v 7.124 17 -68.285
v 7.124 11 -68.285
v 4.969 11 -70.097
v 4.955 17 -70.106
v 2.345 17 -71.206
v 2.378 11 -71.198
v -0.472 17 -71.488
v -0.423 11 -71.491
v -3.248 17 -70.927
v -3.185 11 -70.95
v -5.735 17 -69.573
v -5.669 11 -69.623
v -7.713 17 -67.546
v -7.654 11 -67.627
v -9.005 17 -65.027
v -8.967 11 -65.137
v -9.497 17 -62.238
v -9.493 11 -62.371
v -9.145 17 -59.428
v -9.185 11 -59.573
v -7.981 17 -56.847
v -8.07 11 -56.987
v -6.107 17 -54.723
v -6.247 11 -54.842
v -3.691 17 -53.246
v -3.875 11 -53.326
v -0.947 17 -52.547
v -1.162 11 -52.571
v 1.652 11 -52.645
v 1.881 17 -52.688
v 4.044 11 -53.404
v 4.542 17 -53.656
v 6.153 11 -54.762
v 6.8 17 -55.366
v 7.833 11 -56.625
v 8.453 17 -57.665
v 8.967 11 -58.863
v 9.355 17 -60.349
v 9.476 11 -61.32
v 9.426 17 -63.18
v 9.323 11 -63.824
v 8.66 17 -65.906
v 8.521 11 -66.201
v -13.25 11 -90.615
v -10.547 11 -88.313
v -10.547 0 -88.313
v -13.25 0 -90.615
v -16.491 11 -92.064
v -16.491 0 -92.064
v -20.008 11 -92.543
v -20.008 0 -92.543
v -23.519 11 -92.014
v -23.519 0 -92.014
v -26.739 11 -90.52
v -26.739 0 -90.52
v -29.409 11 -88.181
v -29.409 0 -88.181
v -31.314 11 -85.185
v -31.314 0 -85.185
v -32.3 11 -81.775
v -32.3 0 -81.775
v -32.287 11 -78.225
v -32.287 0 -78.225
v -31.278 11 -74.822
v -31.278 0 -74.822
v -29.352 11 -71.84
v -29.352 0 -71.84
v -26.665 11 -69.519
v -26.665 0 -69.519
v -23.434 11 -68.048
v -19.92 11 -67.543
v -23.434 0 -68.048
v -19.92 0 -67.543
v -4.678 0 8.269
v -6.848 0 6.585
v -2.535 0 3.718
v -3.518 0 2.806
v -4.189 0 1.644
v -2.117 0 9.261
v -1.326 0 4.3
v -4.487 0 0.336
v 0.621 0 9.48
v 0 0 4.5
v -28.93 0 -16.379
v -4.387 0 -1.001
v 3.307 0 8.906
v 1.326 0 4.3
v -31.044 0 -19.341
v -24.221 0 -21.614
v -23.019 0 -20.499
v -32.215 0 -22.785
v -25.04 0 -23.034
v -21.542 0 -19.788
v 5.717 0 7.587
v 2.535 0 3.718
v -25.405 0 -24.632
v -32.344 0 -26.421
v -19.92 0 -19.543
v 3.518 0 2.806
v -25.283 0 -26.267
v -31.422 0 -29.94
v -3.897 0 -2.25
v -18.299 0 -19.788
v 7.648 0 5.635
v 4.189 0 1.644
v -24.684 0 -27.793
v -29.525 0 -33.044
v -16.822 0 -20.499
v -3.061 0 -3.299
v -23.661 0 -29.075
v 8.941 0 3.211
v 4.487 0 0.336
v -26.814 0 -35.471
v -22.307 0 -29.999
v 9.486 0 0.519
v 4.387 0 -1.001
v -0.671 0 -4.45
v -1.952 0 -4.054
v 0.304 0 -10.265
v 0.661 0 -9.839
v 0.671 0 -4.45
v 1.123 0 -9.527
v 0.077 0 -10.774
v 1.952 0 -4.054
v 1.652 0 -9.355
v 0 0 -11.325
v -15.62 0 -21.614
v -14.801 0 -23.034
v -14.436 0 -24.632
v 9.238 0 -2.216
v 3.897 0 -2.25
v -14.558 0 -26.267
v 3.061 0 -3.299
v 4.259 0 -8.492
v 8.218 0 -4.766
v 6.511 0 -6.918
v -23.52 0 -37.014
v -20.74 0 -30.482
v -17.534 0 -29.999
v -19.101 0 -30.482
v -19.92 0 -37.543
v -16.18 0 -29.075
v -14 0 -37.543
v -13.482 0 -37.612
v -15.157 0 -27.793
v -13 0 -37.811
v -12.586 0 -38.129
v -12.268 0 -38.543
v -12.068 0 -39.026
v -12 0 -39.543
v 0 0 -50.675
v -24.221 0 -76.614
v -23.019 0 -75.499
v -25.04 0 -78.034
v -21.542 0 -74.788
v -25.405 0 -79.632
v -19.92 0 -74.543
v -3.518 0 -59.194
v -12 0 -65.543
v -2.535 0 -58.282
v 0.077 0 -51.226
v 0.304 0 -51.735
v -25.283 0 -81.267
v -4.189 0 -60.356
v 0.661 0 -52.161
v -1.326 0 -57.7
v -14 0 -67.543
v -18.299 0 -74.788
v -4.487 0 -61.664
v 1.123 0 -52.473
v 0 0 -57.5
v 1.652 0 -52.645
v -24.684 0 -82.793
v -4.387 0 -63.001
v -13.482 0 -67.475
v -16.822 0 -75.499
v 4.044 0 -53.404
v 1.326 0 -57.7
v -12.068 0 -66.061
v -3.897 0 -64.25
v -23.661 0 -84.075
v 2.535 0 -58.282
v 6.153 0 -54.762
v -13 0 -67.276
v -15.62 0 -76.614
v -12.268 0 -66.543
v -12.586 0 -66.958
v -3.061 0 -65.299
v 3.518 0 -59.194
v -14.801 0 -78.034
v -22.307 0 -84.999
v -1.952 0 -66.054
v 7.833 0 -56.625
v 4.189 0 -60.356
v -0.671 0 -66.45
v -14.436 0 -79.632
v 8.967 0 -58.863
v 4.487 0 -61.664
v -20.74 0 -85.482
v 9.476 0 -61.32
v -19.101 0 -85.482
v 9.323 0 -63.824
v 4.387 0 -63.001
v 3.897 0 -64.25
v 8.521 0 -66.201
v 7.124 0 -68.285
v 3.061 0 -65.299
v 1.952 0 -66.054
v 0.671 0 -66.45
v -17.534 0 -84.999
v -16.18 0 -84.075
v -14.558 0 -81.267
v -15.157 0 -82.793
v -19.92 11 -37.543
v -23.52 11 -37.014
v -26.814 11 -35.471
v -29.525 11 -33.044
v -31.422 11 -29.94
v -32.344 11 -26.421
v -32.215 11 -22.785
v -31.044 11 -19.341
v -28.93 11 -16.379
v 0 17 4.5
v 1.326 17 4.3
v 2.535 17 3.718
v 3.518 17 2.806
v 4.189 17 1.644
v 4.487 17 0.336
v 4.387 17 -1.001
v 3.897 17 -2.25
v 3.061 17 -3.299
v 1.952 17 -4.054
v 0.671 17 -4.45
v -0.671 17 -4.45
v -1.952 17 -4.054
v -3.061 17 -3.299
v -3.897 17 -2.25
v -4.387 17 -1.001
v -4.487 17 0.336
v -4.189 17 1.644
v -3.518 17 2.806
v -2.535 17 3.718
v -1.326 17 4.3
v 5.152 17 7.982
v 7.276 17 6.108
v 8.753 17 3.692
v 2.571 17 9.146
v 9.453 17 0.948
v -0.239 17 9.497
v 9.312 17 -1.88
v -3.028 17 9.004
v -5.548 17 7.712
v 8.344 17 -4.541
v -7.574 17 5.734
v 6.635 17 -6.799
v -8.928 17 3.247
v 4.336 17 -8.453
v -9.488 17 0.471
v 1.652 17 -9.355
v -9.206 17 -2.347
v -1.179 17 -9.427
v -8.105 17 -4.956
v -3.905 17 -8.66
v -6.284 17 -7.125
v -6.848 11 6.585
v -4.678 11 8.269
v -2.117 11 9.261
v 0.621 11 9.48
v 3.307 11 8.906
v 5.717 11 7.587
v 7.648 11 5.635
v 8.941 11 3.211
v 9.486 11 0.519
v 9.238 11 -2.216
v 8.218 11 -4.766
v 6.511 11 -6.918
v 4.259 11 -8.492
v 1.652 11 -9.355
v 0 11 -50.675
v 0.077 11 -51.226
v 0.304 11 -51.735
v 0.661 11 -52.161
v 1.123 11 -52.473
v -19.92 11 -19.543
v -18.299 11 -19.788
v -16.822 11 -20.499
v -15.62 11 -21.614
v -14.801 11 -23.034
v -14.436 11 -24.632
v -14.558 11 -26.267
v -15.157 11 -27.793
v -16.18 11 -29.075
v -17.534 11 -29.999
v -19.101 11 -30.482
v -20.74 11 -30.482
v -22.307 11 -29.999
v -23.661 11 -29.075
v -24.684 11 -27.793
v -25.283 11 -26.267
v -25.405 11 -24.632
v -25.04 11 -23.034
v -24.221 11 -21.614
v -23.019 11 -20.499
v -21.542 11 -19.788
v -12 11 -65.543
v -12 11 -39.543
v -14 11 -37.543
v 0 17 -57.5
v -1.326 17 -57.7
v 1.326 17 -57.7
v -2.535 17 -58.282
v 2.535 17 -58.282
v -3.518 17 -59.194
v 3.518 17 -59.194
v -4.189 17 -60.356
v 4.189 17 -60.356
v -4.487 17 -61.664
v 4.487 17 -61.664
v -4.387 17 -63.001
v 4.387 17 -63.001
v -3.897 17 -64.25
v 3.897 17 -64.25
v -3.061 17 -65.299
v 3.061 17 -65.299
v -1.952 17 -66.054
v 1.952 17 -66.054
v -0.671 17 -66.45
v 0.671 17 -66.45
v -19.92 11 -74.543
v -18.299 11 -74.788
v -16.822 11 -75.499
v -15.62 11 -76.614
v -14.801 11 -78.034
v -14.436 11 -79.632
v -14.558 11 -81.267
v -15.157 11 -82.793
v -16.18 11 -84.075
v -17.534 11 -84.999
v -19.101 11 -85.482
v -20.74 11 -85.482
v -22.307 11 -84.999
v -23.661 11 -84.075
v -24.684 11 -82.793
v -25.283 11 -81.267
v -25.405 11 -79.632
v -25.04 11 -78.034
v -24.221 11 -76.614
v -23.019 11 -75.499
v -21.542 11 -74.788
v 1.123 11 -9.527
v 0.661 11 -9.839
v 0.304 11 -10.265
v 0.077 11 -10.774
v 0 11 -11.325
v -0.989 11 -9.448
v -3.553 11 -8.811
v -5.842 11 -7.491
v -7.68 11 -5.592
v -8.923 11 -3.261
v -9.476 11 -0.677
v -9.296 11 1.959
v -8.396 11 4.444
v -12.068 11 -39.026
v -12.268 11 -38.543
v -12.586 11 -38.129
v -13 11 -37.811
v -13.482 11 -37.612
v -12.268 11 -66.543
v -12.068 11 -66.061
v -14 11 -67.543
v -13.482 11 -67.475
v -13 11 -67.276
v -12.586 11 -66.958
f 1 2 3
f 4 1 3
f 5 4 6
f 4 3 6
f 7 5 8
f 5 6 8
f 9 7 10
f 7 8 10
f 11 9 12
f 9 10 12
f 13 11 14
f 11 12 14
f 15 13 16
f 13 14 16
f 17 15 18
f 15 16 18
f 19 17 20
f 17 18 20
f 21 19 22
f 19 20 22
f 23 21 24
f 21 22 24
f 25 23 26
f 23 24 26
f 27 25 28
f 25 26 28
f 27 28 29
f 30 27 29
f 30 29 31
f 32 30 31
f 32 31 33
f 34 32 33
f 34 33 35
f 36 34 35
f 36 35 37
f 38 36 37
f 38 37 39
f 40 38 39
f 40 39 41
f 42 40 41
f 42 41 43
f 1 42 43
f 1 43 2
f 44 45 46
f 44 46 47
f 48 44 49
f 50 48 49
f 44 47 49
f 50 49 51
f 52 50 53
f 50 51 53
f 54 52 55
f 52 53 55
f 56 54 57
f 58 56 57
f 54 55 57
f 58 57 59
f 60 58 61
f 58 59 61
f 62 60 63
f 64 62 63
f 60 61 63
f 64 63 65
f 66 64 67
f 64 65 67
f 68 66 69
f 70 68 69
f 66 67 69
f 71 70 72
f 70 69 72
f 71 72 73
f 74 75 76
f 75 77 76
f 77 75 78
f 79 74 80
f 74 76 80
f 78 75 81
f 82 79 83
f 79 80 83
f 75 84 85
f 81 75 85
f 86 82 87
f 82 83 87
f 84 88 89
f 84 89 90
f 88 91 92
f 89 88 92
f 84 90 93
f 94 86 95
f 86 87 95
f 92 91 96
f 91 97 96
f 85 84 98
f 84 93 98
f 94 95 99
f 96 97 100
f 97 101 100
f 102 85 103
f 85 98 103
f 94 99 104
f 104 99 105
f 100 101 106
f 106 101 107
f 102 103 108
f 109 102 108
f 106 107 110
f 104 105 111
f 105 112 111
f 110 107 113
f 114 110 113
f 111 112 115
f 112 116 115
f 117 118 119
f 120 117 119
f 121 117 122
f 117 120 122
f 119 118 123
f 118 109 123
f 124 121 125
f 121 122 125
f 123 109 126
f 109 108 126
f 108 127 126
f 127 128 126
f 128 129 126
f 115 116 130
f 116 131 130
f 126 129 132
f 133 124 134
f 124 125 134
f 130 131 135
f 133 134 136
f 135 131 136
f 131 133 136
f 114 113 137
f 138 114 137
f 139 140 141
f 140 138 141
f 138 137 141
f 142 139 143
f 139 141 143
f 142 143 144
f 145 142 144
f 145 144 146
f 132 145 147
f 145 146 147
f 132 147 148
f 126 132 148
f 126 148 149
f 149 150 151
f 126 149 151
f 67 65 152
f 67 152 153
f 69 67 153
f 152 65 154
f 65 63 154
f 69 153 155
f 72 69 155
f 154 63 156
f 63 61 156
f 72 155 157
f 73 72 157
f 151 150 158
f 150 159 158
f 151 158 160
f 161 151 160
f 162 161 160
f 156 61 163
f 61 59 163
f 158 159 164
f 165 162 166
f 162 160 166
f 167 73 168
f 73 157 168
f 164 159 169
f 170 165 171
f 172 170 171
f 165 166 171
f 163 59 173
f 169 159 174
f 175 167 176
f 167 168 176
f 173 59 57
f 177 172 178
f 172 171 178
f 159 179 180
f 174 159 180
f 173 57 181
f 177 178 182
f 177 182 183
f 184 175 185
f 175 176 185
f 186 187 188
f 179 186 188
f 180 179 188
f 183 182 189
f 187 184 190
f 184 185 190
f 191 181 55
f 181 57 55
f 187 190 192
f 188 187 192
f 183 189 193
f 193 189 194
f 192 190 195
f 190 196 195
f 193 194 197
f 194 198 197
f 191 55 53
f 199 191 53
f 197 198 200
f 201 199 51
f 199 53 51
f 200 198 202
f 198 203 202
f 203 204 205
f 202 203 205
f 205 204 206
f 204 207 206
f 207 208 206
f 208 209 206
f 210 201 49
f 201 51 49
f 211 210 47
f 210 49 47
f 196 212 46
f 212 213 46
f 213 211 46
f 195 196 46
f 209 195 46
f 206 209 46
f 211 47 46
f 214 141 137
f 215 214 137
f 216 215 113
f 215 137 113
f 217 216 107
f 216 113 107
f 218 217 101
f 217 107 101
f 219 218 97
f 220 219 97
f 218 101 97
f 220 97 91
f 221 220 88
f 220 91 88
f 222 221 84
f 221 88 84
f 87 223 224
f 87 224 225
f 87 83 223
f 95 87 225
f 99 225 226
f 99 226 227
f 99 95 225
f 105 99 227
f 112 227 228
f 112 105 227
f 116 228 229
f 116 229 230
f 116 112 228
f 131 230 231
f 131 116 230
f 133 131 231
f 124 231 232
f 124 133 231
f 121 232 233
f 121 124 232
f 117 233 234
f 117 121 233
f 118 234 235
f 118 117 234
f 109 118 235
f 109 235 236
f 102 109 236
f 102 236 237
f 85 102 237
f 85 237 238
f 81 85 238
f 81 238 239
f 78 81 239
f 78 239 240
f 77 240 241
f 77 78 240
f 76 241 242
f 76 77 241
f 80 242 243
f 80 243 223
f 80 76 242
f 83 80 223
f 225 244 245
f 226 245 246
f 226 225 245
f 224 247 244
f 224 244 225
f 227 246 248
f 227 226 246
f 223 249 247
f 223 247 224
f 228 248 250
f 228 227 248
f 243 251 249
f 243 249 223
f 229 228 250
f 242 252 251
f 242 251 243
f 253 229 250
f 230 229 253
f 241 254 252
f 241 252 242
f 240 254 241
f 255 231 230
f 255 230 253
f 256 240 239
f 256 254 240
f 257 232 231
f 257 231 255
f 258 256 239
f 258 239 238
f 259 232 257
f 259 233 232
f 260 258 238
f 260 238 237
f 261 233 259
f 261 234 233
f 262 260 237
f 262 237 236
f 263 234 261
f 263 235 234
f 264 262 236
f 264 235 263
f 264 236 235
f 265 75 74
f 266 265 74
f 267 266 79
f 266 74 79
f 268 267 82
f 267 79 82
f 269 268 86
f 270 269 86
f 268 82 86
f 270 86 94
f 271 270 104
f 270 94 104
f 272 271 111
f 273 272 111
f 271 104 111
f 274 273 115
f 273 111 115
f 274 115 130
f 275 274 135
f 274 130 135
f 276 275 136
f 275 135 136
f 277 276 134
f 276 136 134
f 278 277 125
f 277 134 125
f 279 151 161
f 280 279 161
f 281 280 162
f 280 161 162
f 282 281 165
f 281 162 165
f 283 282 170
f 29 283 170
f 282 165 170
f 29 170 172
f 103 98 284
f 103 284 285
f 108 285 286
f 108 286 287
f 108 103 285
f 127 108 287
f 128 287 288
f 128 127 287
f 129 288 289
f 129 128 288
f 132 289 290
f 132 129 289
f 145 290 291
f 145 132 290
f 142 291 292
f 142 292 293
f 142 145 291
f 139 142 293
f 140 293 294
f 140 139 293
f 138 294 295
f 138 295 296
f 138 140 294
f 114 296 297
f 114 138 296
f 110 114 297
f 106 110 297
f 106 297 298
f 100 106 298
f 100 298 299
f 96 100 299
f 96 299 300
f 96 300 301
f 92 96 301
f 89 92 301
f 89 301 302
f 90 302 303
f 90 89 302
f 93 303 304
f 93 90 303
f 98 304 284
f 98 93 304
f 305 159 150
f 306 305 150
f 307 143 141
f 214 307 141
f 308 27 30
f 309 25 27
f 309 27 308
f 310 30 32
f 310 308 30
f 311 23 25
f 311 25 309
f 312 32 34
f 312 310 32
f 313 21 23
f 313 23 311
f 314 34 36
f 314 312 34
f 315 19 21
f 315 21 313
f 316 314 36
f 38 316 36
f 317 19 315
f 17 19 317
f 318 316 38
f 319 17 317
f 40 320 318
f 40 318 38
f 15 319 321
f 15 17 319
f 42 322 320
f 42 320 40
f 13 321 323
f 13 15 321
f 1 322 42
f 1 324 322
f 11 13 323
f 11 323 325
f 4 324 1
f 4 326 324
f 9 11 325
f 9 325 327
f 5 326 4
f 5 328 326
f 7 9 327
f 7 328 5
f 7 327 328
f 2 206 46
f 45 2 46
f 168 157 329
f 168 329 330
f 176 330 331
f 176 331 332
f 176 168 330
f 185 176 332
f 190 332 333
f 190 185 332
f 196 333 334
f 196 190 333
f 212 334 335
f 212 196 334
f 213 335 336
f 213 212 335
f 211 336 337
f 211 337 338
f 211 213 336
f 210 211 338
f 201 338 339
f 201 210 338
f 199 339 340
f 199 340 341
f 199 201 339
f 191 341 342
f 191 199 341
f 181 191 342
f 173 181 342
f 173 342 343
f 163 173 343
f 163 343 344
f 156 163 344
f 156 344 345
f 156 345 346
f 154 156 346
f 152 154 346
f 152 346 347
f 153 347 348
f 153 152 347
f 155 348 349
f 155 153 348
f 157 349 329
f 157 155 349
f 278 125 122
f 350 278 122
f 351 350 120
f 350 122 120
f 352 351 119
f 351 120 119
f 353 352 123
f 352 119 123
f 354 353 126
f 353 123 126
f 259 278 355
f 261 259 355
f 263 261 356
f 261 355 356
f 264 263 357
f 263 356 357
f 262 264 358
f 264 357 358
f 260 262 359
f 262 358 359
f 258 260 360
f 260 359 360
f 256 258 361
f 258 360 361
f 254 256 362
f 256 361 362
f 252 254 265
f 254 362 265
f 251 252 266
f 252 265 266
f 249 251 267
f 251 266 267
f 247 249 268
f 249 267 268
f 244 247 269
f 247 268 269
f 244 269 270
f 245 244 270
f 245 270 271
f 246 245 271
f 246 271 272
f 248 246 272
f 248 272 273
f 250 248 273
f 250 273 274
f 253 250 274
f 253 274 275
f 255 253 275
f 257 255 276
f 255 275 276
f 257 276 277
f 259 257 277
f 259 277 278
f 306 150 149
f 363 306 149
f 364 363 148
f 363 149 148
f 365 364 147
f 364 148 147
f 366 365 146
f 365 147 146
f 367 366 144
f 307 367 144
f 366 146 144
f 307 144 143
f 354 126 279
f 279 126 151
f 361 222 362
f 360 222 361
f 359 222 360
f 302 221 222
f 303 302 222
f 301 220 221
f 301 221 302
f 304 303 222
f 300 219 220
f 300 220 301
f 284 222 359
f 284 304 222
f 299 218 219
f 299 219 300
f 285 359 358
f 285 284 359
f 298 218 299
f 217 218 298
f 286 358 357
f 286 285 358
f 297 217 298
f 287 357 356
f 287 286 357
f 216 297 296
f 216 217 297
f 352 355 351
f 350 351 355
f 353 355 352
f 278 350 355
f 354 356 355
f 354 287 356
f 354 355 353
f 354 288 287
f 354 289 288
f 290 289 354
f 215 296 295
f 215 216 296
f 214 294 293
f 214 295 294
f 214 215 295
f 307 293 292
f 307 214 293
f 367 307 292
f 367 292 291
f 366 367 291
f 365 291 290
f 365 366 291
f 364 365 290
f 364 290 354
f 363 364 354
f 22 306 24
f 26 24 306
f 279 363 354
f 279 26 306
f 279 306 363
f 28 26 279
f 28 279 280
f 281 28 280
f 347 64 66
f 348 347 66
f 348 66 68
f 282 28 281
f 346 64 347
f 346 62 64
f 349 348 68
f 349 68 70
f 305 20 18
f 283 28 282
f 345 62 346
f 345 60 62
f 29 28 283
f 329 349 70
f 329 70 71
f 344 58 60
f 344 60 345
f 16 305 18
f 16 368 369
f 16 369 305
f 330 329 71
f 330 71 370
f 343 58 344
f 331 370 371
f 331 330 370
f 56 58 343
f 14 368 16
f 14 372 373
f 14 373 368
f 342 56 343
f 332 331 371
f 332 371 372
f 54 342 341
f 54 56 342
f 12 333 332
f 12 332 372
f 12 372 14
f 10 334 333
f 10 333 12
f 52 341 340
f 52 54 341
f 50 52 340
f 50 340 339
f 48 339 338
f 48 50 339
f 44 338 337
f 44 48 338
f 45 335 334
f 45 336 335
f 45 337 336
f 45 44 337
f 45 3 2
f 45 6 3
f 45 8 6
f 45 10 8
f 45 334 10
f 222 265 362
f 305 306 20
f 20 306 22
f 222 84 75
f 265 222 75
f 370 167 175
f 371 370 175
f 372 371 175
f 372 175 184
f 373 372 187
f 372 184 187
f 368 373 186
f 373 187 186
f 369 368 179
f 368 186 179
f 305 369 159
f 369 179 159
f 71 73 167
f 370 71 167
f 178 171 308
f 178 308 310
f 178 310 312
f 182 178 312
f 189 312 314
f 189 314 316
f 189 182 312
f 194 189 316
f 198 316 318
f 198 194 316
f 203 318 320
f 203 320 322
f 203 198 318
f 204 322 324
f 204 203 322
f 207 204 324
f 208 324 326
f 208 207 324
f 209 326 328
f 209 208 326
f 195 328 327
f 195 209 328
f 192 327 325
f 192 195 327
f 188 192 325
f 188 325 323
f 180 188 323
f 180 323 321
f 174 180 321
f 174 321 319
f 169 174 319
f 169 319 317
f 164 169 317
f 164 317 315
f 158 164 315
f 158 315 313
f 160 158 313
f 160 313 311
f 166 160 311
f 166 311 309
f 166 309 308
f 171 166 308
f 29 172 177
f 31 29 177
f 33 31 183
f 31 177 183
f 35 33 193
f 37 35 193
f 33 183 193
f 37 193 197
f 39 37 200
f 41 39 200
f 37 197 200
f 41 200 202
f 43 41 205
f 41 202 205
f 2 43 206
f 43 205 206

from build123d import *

# Parameters (mm, degrees)
ESQUISSE1_R        = 4.5
ESQUISSE1_R_2      = 5.5
BOSS_EXTRU_1_DEPTH = 11
ESQUISSE3_R        = 9.5
ESQUISSE3_R_2      = 4.5
BOSS_EXTRU_3_DEPTH = 6


with BuildPart() as part:
    # Esquisse1 → Boss.-Extru.1 (new body)
    with BuildSketch(Plane(origin=(0, 0, 0), x_dir=(1, 0, 0), z_dir=(0, 1, 0))):
        with BuildLine():
            Line((-28.930476165, 16.379180347), (-6.847605923, -6.584853311))
            ThreePointArc((-6.847605923, -6.584853311), (8.382701799, -4.469934065), (1.652173913, 9.355229626))
            ThreePointArc((1.652173913, 9.355229626), (0.467738245, 10.039382479), (0, 11.324751653))
            Line((0, 11.324751653), (0, 50.675248347))
            ThreePointArc((0, 50.675248347), (0.467738245, 51.960617521), (1.652173913, 52.644770374))
            ThreePointArc((1.652173913, 52.644770374), (8.967130897, 58.863032758), (7.12365328, 68.285186071))
            Line((7.12365328, 68.285186071), (-10.547240372, 88.313442691))
            ThreePointArc((-10.547240372, 88.313442691), (-31.313992211, 85.185213109), (-19.920468372, 67.543461019))
            Line((-19.920468372, 67.543461019), (-14, 67.543461019))
            ThreePointArc((-14, 67.543461019), (-12.585786438, 66.957674582), (-12, 65.543461019))
            Line((-12, 65.543461019), (-12, 39.543461019))
            ThreePointArc((-12, 39.543461019), (-12.585786438, 38.129247457), (-14, 37.543461019))
            Line((-14, 37.543461019), (-19.920468372, 37.543461019))
            ThreePointArc((-19.920468372, 37.543461019), (-31.42163154, 29.939709154), (-28.930476165, 16.379180347))
        make_face()
        with Locations(Location((0, 0, 0), (0, 0, 270))):  # turned: the seam where the file's is
            Circle(ESQUISSE1_R, mode=Mode.SUBTRACT)
        with Locations(Location((-19.920468372, 25.043461019, 0), (0, 0, 270))):  # turned: the seam where the file's is
            Circle(ESQUISSE1_R_2, mode=Mode.SUBTRACT)
        with Locations(Location((0, 62, 0), (0, 0, 270))):  # turned: the seam where the file's is
            Circle(ESQUISSE1_R, mode=Mode.SUBTRACT)
        with Locations(Location((-19.920468372, 80.043461019, 0), (0, 0, 270))):  # turned: the seam where the file's is
            Circle(ESQUISSE1_R_2, mode=Mode.SUBTRACT)
    extrude(amount=BOSS_EXTRU_1_DEPTH)

    # Esquisse3 → Boss.-Extru.3 (add)
    with BuildSketch(Plane(origin=(0, 11, 0), x_dir=(1, 0, 0), z_dir=(0, 1, 0))):
        with Locations(Location((0, 0, 0), (0, 0, 79.984589832))):  # turned: the seam where the file's is
            Circle(ESQUISSE3_R)
        with Locations(Location((0, 0, 0), (0, 0, 270))):  # turned: the seam where the file's is
            Circle(ESQUISSE3_R_2, mode=Mode.SUBTRACT)
        with Locations(Location((0, 62, 0), (0, 0, 41.421900303))):  # turned: the seam where the file's is
            Circle(ESQUISSE3_R)
        with Locations(Location((0, 62, 0), (0, 0, 270))):  # turned: the seam where the file's is
            Circle(ESQUISSE3_R_2, mode=Mode.SUBTRACT)
    extrude(amount=BOSS_EXTRU_3_DEPTH)


solid = part.part
